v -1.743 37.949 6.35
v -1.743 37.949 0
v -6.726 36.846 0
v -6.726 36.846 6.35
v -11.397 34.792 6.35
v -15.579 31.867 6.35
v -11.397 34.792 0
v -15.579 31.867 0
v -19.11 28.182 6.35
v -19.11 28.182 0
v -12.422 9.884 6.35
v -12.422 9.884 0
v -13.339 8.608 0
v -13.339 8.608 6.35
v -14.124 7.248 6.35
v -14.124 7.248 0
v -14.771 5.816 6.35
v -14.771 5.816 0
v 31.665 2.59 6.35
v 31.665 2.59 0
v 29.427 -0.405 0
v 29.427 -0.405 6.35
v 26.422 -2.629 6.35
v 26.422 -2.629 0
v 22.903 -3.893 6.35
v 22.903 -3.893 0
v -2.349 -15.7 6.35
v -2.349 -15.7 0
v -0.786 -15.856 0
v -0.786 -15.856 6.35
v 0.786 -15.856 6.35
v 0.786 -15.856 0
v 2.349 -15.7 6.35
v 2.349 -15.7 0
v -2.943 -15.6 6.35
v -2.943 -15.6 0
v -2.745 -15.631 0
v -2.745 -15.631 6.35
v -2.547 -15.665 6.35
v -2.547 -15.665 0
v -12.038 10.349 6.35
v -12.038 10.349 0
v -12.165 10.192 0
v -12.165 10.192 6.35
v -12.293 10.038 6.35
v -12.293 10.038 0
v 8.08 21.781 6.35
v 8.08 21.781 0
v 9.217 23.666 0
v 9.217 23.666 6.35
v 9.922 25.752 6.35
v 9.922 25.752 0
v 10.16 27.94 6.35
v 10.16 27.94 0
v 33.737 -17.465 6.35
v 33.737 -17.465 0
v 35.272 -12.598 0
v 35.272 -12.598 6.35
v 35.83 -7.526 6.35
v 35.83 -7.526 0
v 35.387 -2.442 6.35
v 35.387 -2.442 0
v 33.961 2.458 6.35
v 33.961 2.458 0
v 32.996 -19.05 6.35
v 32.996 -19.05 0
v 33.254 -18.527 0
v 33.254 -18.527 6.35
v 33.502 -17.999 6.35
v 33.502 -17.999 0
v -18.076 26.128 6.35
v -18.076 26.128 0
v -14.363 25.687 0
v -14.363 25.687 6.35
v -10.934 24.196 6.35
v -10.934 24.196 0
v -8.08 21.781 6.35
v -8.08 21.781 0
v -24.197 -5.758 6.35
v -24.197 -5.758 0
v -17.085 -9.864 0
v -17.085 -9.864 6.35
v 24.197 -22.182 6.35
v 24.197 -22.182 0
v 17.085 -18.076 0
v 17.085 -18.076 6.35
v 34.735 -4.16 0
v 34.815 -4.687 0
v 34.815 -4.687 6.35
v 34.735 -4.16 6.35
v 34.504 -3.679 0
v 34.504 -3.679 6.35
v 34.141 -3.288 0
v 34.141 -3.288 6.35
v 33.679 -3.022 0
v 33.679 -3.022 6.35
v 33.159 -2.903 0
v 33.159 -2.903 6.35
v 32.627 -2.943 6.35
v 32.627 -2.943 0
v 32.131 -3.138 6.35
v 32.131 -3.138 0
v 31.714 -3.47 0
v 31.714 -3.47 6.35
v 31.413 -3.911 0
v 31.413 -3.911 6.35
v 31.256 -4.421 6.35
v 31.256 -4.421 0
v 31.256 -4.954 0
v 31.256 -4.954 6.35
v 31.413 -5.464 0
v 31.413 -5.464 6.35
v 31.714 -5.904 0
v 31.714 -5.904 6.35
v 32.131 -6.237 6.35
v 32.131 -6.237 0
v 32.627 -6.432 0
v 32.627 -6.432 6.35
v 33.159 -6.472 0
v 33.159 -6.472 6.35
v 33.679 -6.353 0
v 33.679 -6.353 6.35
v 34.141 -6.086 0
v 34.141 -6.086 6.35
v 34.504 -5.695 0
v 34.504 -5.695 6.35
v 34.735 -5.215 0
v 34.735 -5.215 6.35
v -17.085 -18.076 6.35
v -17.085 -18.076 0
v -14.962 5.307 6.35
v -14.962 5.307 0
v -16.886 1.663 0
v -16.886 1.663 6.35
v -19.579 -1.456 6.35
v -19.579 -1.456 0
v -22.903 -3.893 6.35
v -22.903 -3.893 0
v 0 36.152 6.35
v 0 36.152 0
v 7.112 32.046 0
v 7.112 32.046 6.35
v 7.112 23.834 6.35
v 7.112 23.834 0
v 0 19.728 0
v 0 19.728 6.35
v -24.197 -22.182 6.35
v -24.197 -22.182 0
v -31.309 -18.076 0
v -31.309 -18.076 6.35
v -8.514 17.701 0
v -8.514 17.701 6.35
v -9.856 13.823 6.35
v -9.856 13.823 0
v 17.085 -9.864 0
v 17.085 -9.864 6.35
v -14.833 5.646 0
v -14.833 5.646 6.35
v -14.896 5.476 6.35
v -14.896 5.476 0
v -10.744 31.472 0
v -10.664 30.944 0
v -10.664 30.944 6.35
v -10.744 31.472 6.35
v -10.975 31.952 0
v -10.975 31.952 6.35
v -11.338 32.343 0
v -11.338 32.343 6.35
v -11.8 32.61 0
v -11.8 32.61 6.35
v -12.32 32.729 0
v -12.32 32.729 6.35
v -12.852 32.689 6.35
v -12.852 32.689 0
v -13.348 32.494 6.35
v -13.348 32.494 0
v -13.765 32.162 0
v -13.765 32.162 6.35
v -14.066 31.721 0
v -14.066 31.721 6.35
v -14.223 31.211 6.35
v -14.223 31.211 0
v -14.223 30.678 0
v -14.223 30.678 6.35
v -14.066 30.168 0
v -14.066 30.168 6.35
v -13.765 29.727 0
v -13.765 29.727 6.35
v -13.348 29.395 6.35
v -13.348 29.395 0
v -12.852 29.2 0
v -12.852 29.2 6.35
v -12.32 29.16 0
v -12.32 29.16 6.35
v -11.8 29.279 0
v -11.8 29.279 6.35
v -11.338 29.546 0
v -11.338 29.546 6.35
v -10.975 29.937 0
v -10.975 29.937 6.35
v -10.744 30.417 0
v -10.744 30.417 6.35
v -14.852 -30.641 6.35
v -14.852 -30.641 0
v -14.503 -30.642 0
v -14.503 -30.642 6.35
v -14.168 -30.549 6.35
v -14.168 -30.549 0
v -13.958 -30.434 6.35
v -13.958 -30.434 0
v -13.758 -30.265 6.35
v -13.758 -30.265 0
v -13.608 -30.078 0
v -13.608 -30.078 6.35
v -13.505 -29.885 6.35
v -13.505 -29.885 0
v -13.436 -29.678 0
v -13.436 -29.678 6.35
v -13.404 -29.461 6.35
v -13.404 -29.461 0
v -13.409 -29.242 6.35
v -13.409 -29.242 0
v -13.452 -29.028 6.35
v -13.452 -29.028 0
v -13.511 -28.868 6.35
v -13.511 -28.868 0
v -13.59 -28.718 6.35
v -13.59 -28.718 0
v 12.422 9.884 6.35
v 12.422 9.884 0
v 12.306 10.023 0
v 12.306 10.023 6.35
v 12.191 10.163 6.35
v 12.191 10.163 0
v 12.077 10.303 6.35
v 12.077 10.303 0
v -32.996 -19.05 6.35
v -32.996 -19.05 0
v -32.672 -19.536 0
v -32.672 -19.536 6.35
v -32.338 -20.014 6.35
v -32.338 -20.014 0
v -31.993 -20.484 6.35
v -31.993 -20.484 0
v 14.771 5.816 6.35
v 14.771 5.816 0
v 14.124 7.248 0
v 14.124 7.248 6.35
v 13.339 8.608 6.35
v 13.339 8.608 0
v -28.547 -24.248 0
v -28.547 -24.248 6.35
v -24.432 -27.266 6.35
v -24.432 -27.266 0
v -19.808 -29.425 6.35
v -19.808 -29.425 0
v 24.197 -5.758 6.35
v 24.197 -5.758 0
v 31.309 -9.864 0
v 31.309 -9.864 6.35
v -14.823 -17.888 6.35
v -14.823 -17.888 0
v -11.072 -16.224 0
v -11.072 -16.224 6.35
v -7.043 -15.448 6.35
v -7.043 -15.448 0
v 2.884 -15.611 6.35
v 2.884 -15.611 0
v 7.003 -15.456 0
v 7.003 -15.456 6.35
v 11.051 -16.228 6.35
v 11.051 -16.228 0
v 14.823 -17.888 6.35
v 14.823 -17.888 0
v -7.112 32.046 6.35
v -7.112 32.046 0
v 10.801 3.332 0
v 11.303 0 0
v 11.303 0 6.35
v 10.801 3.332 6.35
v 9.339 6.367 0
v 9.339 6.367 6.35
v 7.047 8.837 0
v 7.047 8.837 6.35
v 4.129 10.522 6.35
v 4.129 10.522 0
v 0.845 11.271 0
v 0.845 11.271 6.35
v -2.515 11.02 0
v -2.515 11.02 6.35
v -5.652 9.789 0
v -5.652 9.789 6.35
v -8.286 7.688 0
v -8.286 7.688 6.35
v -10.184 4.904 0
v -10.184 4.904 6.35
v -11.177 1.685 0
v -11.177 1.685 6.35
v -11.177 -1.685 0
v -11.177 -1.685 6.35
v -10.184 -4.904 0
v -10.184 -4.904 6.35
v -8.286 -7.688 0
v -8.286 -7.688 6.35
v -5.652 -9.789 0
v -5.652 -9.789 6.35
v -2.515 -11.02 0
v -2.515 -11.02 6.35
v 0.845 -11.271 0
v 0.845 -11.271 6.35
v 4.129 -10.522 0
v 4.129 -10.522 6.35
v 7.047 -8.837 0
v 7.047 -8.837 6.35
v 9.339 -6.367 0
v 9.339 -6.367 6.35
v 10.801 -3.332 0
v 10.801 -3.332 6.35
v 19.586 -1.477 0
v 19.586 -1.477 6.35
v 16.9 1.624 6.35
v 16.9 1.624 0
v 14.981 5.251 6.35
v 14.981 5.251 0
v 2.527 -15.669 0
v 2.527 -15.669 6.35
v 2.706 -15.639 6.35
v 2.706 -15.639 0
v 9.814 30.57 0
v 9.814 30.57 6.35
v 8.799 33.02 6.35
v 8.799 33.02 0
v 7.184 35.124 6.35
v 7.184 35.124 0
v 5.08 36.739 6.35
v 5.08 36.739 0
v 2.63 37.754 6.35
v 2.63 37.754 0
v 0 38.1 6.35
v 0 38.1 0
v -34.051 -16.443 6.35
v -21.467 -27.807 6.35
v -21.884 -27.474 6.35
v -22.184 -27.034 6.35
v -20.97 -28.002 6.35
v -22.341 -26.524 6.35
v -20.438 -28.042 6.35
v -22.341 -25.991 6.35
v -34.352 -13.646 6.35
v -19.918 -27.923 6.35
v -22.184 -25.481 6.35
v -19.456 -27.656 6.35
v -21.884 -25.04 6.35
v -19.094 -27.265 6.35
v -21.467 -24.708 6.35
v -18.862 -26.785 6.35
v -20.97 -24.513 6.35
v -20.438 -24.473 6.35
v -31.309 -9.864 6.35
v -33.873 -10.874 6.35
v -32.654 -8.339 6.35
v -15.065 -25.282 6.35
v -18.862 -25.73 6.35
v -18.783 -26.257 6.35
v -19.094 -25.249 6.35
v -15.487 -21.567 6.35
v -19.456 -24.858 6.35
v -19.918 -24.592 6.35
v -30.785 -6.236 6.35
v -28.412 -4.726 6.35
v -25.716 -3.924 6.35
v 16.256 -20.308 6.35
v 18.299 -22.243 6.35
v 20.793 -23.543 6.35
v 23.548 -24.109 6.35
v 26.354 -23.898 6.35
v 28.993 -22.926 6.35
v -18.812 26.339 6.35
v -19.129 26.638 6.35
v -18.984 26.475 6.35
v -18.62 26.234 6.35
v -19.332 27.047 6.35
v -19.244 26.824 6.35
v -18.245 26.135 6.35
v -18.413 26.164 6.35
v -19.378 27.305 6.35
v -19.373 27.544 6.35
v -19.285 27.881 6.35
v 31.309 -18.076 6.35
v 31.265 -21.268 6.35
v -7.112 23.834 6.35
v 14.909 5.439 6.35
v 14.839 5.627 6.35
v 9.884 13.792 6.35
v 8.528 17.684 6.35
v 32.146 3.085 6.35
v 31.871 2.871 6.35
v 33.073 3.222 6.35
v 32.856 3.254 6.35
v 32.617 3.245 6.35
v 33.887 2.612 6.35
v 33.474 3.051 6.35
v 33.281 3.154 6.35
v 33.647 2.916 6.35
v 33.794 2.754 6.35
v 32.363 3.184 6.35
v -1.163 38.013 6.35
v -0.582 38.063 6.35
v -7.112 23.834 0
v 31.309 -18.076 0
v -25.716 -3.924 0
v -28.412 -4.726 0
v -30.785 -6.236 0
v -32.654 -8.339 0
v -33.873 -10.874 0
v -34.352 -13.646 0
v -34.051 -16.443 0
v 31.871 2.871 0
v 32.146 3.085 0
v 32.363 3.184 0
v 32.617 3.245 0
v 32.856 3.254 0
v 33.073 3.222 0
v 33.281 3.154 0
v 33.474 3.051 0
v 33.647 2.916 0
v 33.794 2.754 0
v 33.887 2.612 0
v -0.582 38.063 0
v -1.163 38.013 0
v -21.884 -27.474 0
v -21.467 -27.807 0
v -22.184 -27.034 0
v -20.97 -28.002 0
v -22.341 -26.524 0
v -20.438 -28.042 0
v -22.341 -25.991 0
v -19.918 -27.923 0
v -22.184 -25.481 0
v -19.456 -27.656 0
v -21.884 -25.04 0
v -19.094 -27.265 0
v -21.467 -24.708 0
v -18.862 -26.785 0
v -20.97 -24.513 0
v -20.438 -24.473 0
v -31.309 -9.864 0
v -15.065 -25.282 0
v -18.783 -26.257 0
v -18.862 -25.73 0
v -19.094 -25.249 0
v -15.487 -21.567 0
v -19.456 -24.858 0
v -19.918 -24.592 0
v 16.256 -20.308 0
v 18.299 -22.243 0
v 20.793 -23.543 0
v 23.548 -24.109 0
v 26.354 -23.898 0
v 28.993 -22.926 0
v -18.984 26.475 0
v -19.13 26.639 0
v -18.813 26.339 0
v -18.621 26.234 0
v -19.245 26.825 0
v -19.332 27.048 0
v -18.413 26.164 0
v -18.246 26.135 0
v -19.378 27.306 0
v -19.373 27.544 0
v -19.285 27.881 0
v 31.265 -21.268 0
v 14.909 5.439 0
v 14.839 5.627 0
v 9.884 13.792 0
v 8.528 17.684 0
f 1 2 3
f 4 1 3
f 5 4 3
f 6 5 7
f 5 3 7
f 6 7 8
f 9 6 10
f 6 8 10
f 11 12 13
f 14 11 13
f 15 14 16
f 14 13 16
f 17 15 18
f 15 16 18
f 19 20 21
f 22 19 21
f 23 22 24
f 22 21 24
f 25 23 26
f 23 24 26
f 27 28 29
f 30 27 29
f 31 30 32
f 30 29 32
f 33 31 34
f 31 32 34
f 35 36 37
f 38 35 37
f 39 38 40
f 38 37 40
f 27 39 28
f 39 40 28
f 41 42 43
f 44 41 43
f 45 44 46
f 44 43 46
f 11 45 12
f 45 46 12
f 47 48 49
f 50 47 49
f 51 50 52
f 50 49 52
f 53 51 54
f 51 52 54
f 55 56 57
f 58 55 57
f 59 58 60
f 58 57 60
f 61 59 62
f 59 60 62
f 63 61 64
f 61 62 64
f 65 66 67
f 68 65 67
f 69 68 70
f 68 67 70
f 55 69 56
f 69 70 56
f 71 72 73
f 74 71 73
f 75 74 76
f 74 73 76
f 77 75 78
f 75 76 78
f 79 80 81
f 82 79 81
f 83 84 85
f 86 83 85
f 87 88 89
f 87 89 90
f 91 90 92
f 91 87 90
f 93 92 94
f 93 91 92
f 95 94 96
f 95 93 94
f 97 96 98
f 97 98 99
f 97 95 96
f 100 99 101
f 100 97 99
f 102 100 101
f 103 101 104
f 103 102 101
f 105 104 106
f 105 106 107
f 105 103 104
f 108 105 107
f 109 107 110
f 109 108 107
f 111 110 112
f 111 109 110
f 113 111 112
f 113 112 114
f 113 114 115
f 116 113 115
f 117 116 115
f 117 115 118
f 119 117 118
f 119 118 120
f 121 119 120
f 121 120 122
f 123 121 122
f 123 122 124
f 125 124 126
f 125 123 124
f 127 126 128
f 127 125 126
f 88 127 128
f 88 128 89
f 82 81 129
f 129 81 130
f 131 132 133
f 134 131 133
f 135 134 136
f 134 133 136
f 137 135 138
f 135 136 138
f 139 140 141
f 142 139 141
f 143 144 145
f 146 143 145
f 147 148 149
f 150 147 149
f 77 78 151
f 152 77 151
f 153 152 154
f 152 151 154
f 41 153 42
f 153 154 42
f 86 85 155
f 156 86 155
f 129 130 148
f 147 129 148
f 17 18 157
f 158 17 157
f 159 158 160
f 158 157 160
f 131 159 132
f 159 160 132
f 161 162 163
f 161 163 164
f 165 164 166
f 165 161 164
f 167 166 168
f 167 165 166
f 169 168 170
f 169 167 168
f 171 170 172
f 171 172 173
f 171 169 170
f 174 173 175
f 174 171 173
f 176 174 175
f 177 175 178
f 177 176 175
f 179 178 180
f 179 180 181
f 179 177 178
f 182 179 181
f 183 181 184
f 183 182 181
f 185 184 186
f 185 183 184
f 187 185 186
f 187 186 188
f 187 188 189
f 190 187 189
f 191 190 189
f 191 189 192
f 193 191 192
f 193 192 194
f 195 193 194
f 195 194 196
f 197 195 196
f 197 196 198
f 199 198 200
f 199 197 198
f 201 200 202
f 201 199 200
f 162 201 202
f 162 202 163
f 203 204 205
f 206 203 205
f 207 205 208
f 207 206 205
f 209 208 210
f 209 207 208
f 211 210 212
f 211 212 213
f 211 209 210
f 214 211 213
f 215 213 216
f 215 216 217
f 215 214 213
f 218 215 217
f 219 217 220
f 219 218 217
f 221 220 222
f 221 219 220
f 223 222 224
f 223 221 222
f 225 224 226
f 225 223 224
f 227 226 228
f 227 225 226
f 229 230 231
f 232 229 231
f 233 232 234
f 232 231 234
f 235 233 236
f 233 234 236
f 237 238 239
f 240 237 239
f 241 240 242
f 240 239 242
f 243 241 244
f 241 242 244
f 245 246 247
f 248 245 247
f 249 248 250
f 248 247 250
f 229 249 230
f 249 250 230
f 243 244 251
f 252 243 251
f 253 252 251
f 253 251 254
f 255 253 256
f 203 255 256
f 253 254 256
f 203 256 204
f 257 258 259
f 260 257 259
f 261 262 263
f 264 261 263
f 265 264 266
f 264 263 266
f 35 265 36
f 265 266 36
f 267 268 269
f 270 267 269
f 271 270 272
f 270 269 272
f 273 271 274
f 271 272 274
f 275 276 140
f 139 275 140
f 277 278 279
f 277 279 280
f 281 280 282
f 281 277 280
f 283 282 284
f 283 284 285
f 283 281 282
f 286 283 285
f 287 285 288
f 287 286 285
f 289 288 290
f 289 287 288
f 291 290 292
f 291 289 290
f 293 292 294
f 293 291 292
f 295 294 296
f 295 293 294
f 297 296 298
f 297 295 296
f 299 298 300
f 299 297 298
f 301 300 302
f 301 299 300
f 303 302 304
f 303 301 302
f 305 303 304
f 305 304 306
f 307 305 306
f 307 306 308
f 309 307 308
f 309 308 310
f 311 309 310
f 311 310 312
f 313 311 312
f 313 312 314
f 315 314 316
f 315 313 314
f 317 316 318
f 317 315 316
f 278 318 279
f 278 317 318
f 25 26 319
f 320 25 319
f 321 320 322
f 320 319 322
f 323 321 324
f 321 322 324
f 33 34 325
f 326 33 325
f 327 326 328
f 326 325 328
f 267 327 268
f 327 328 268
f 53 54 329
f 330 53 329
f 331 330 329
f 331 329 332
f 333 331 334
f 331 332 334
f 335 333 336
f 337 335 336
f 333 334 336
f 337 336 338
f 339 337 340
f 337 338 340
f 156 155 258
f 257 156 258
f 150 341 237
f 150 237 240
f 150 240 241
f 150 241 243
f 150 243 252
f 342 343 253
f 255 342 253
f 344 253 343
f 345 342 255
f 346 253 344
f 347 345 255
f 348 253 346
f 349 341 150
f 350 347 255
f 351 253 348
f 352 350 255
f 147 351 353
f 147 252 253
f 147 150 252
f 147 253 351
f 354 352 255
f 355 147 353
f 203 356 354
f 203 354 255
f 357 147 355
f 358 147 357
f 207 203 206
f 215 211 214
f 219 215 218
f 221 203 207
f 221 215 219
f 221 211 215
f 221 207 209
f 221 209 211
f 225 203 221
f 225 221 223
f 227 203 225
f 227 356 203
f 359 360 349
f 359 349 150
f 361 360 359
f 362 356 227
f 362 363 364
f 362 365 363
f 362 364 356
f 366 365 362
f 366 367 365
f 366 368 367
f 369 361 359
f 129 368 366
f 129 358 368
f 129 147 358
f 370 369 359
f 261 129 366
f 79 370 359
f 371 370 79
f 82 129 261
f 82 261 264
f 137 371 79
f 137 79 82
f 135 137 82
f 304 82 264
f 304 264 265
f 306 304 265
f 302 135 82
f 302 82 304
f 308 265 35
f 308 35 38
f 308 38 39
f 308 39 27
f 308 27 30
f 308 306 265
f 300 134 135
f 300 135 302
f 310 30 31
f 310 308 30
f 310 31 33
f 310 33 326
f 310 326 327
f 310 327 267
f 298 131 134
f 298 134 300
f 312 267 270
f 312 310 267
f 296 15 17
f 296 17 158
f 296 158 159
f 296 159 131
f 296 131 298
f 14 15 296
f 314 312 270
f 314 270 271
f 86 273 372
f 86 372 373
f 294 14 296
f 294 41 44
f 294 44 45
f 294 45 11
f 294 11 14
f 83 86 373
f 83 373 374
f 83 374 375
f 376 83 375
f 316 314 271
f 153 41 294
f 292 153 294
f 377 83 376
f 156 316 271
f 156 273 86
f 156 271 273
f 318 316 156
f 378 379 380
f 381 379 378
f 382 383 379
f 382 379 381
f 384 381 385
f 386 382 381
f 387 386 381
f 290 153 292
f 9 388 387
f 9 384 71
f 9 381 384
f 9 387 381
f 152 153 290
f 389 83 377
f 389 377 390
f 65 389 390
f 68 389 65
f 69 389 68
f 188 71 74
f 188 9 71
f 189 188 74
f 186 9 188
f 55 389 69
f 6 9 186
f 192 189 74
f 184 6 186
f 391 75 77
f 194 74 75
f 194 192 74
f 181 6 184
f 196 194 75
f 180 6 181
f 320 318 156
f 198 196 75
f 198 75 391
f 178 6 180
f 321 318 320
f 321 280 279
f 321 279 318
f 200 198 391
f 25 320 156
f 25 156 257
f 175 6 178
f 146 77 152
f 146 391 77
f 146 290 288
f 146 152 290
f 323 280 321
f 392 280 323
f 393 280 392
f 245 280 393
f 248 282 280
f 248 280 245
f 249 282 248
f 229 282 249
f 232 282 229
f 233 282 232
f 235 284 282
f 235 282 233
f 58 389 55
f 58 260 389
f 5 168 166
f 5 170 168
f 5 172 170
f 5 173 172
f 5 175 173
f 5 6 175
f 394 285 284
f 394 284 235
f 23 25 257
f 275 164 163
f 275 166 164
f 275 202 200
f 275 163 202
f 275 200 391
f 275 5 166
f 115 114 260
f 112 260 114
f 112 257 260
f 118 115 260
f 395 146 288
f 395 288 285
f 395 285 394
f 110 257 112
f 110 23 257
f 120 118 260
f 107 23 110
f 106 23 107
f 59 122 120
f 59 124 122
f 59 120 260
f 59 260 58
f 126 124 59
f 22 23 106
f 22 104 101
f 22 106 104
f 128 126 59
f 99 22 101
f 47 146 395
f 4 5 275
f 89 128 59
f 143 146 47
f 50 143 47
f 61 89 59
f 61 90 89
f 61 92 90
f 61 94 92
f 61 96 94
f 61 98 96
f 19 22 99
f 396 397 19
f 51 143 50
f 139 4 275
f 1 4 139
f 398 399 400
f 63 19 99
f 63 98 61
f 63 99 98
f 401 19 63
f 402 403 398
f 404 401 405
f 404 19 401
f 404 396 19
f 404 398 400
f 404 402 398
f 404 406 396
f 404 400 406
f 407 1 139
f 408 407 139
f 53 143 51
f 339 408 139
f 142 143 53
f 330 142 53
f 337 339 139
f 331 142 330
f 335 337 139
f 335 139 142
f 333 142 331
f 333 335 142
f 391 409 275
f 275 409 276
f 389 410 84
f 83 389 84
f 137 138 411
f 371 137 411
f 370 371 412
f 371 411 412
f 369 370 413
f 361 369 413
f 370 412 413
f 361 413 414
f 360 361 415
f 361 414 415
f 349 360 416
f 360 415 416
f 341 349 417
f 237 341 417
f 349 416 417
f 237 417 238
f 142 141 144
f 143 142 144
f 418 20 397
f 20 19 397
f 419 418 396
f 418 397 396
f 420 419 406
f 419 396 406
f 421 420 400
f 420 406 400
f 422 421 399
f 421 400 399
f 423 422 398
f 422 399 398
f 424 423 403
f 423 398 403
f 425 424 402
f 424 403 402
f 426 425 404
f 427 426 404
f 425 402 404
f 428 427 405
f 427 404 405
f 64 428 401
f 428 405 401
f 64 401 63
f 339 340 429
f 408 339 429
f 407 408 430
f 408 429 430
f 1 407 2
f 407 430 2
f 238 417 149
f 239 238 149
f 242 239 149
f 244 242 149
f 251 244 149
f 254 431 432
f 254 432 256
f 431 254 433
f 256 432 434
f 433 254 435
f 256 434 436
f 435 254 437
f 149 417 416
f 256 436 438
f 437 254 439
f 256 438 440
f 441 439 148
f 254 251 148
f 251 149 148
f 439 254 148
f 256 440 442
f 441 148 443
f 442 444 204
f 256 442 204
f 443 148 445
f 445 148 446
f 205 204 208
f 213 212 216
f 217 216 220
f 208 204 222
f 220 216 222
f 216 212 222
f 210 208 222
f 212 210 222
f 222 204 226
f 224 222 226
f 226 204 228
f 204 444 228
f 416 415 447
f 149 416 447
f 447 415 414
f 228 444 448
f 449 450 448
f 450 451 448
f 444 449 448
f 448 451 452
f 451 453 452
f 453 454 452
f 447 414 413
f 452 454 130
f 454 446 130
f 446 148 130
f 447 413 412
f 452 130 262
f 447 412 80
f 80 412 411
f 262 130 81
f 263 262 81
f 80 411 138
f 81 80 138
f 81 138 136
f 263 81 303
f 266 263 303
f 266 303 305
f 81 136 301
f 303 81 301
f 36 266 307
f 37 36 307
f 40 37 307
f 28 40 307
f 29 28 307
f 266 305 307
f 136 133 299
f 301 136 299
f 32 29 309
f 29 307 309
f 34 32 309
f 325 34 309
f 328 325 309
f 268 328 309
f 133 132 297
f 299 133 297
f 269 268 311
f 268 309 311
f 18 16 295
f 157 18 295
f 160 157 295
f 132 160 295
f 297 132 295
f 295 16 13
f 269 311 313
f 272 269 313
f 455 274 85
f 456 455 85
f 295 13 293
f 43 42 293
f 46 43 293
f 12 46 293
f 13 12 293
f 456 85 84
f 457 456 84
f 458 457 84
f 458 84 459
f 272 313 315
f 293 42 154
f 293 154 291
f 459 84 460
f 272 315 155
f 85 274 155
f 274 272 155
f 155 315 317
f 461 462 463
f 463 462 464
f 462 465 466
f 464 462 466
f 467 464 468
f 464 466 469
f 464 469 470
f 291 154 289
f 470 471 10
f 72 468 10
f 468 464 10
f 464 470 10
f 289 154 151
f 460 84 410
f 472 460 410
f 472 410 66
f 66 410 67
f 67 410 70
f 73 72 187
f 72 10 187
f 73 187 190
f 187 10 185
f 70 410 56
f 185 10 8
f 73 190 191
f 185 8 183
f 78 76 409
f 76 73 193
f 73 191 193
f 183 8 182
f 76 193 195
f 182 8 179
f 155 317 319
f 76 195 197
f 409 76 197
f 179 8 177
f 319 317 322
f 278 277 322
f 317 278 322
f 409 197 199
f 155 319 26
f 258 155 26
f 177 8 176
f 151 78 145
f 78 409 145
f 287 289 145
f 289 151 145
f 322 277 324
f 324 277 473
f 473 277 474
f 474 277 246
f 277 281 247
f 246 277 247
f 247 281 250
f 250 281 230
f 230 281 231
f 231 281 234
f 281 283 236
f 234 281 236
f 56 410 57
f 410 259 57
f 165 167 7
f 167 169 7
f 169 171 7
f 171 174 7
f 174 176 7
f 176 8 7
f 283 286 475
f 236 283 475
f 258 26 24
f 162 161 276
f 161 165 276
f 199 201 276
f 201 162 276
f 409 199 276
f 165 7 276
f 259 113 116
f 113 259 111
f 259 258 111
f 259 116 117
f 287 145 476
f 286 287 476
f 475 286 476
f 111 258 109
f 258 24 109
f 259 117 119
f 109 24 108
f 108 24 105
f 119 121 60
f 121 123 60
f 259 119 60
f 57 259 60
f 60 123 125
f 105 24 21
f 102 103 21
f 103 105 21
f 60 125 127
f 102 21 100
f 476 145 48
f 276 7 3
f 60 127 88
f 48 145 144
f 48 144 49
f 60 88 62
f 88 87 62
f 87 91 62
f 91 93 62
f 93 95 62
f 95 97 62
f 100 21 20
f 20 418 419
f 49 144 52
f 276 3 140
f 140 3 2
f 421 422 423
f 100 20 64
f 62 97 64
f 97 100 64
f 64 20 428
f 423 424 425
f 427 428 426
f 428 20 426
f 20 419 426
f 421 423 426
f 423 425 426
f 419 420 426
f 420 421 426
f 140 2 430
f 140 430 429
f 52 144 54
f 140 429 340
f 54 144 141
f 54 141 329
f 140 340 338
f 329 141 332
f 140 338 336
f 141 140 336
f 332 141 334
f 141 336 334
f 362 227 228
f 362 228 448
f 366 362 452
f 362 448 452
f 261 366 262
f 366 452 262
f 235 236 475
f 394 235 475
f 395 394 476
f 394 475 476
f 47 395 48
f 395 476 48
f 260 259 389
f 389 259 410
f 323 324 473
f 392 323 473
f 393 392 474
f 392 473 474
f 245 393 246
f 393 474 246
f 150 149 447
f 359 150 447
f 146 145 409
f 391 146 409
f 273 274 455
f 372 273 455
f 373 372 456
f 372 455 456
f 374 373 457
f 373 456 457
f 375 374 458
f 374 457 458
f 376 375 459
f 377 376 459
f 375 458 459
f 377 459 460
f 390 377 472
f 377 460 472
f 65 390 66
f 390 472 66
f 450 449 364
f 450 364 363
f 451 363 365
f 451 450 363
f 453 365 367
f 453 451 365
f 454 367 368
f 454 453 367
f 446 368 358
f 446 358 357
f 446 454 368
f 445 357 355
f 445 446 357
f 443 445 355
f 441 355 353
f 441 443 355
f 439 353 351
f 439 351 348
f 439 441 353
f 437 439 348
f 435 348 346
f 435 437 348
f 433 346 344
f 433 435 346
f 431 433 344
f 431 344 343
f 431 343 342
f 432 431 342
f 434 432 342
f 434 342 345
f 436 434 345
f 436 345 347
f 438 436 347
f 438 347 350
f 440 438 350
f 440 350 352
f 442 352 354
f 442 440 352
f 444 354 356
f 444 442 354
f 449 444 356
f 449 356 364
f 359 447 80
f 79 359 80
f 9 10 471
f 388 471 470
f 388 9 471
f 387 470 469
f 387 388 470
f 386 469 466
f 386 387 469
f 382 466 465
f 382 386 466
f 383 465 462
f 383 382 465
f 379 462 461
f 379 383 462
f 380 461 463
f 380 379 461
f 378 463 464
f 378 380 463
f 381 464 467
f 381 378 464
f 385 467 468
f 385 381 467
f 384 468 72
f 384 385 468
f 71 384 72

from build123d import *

# Parameters (mm, degrees)
F0_R     = 1.78928
F0_R_2   = 11.303
F1_DEPTH = 6.35
F2_R     = 1.27


with BuildPart() as f1:
    # F0 (on Top) → F1 (new body)
    with BuildSketch(Plane.XY):
        with BuildLine():
            ThreePointArc((12.077109, 10.303352), (9.095838, 15.699831), (8.080235, 21.780827))
            ThreePointArc((8.080235, 21.780827), (0, 17.78), (-8.080235, 21.780827))
            ThreePointArc((-8.080235, 21.780827), (-9.074817, 15.723861), (-12.038361, 10.348599))
            ThreePointArc((-12.038361, 10.348599), (0.029785, 15.874972), (12.077109, 10.303352))
        make_face()
        with BuildLine():
            ThreePointArc((10.16, 27.94), (7.184205, 35.124205), (0, 38.1))
            ThreePointArc((0, 38.1), (-0.87291, 38.039306), (-1.743288, 37.949323))
            ThreePointArc((-1.743288, 37.949323), (-9.459411, 31.647444), (-8.080235, 21.780827))
            ThreePointArc((-8.080235, 21.780827), (0, 17.78), (8.080235, 21.780827))
            ThreePointArc((8.080235, 21.780827), (9.626027, 24.689583), (10.16, 27.94))
        make_face()
        Polygon((-7.112, 32.046115), (0, 36.15223), (7.112, 32.046115), (7.112, 23.833885), (0, 19.72777), (-7.112, 23.833885), align=None, mode=Mode.SUBTRACT)
        with BuildLine():
            ThreePointArc((-8.080235, 21.780827), (-9.459411, 31.647444), (-1.743288, 37.949323))
            ThreePointArc((-1.743288, 37.949323), (-12.66546, 34.030722), (-20.801573, 25.757091))
            ThreePointArc((-20.801573, 25.757091), (-13.884792, 25.548137), (-8.080235, 21.780827))
        make_face()
        with Locations((-12.453423, 30.944496)):
            Circle(F0_R, mode=Mode.SUBTRACT)
        with BuildLine():
            ThreePointArc((2.348846, -15.700272), (2.616295, -15.653525), (2.88441, -15.610759))
            ThreePointArc((2.88441, -15.610759), (12.202574, -10.154448), (15.875, 0))
            ThreePointArc((15.875, 0), (15.649988, 2.663364), (14.98133, 5.251227))
            ThreePointArc((14.98133, 5.251227), (14.873941, 5.532726), (14.771257, 5.815976))
            ThreePointArc((14.771257, 5.815976), (13.748153, 7.9375), (12.422412, 9.884296))
            ThreePointArc((12.422412, 9.884296), (12.248203, 10.092541), (12.077109, 10.303352))
            ThreePointArc((12.077109, 10.303352), (0.029785, 15.874972), (-12.038361, 10.348599))
            ThreePointArc((-12.038361, 10.348599), (-12.228452, 10.114848), (-12.422412, 9.884296))
            ThreePointArc((-12.422412, 9.884296), (-13.748153, 7.9375), (-14.771257, 5.815976))
            ThreePointArc((-14.771257, 5.815976), (-14.864498, 5.560985), (-14.961519, 5.307407))
            ThreePointArc((-14.961519, 5.307407), (-13.763022, -7.911691), (-2.942969, -15.599826))
            ThreePointArc((-2.942969, -15.599826), (-2.645489, -15.647574), (-2.348846, -15.700272))
            ThreePointArc((-2.348846, -15.700272), (0, -15.875), (2.348846, -15.700272))
        make_face()
        Circle(F0_R_2, mode=Mode.SUBTRACT)
        with BuildLine():
            ThreePointArc((-22.902867, -3.892725), (-32.653508, -8.33894), (-32.995568, -19.05))
            ThreePointArc((-32.995568, -19.05), (-32.50655, -19.775615), (-31.993434, -20.484393))
            ThreePointArc((-31.993434, -20.484393), (-22.677785, -24.015812), (-14.822632, -17.888102))
            ThreePointArc((-14.822632, -17.888102), (-14.235158, -15.96807), (-14.03675, -13.97))
            ThreePointArc((-14.03675, -13.97), (-16.568793, -7.258825), (-22.902867, -3.892725))
        make_face()
        Polygon((-17.08475, -9.863885), (-17.08475, -18.076115), (-24.19675, -22.18223), (-31.30875, -18.076115), (-31.30875, -9.863885), (-24.19675, -5.75777), align=None, mode=Mode.SUBTRACT)
        with BuildLine():
            ThreePointArc((-14.961519, 5.307407), (-18.144371, 0.027311), (-22.902867, -3.892725))
            ThreePointArc((-22.902867, -3.892725), (-16.568793, -7.258825), (-14.03675, -13.97))
            ThreePointArc((-14.03675, -13.97), (-14.235158, -15.96807), (-14.822632, -17.888102))
            ThreePointArc((-14.822632, -17.888102), (-9.079854, -15.720953), (-2.942969, -15.599826))
            ThreePointArc((-2.942969, -15.599826), (-13.763022, -7.911691), (-14.961519, 5.307407))
        make_face()
        with BuildLine():
            ThreePointArc((-14.822632, -17.888102), (-22.677785, -24.015812), (-31.993434, -20.484393))
            ThreePointArc((-31.993434, -20.484393), (-23.13874, -27.983971), (-11.905509, -30.893236))
            ThreePointArc((-11.905509, -30.893236), (-15.182939, -24.798651), (-14.822632, -17.888102))
        make_face()
        with Locations((-20.572009, -26.257229)):
            Circle(F0_R, mode=Mode.SUBTRACT)
        with BuildLine():
            ThreePointArc((2.88441, -15.610759), (9.048534, -15.727142), (14.822632, -17.888102))
            ThreePointArc((14.822632, -17.888102), (15.397932, -8.89), (22.902867, -3.892725))
            ThreePointArc((22.902867, -3.892725), (18.154672, -0.002908), (14.98133, 5.251227))
            ThreePointArc((14.98133, 5.251227), (15.649988, 2.663364), (15.875, 0))
            ThreePointArc((15.875, 0), (12.202574, -10.154448), (2.88441, -15.610759))
        make_face()
        with BuildLine():
            ThreePointArc((14.822632, -17.888102), (23.548488, -24.109298), (32.995568, -19.05))
            ThreePointArc((32.995568, -19.05), (33.37946, -18.263691), (33.736722, -17.46493))
            ThreePointArc((33.736722, -17.46493), (34.200542, -15.744752), (34.35675, -13.97))
            ThreePointArc((34.35675, -13.97), (30.907925, -6.342043), (22.902867, -3.892725))
            ThreePointArc((22.902867, -3.892725), (15.397932, -8.89), (14.822632, -17.888102))
        make_face()
        Polygon((17.08475, -9.863885), (24.19675, -5.75777), (31.30875, -9.863885), (31.30875, -18.076115), (24.19675, -22.18223), (17.08475, -18.076115), align=None, mode=Mode.SUBTRACT)
        with BuildLine():
            ThreePointArc((34.35675, -13.97), (34.200542, -15.744752), (33.736722, -17.46493))
            ThreePointArc((33.736722, -17.46493), (35.8042, -6.046751), (32.707082, 5.136145))
            ThreePointArc((32.707082, 5.136145), (29.067732, -0.749485), (22.902867, -3.892725))
            ThreePointArc((22.902867, -3.892725), (30.907925, -6.342043), (34.35675, -13.97))
        make_face()
        with Locations((33.025431, -4.687268)):
            Circle(F0_R, mode=Mode.SUBTRACT)
    extrude(amount=F1_DEPTH)

    # F2
    f2_edges = [f1.edges().sort_by_distance(p)[0] for p in [
        (-20.801573, 25.757091, 3.175),
        (-11.905509, -30.893236, 3.175),
        (32.707082, 5.136145, 3.175),
    ]]
    fillet(f2_edges, radius=F2_R)


solid = f1.part
